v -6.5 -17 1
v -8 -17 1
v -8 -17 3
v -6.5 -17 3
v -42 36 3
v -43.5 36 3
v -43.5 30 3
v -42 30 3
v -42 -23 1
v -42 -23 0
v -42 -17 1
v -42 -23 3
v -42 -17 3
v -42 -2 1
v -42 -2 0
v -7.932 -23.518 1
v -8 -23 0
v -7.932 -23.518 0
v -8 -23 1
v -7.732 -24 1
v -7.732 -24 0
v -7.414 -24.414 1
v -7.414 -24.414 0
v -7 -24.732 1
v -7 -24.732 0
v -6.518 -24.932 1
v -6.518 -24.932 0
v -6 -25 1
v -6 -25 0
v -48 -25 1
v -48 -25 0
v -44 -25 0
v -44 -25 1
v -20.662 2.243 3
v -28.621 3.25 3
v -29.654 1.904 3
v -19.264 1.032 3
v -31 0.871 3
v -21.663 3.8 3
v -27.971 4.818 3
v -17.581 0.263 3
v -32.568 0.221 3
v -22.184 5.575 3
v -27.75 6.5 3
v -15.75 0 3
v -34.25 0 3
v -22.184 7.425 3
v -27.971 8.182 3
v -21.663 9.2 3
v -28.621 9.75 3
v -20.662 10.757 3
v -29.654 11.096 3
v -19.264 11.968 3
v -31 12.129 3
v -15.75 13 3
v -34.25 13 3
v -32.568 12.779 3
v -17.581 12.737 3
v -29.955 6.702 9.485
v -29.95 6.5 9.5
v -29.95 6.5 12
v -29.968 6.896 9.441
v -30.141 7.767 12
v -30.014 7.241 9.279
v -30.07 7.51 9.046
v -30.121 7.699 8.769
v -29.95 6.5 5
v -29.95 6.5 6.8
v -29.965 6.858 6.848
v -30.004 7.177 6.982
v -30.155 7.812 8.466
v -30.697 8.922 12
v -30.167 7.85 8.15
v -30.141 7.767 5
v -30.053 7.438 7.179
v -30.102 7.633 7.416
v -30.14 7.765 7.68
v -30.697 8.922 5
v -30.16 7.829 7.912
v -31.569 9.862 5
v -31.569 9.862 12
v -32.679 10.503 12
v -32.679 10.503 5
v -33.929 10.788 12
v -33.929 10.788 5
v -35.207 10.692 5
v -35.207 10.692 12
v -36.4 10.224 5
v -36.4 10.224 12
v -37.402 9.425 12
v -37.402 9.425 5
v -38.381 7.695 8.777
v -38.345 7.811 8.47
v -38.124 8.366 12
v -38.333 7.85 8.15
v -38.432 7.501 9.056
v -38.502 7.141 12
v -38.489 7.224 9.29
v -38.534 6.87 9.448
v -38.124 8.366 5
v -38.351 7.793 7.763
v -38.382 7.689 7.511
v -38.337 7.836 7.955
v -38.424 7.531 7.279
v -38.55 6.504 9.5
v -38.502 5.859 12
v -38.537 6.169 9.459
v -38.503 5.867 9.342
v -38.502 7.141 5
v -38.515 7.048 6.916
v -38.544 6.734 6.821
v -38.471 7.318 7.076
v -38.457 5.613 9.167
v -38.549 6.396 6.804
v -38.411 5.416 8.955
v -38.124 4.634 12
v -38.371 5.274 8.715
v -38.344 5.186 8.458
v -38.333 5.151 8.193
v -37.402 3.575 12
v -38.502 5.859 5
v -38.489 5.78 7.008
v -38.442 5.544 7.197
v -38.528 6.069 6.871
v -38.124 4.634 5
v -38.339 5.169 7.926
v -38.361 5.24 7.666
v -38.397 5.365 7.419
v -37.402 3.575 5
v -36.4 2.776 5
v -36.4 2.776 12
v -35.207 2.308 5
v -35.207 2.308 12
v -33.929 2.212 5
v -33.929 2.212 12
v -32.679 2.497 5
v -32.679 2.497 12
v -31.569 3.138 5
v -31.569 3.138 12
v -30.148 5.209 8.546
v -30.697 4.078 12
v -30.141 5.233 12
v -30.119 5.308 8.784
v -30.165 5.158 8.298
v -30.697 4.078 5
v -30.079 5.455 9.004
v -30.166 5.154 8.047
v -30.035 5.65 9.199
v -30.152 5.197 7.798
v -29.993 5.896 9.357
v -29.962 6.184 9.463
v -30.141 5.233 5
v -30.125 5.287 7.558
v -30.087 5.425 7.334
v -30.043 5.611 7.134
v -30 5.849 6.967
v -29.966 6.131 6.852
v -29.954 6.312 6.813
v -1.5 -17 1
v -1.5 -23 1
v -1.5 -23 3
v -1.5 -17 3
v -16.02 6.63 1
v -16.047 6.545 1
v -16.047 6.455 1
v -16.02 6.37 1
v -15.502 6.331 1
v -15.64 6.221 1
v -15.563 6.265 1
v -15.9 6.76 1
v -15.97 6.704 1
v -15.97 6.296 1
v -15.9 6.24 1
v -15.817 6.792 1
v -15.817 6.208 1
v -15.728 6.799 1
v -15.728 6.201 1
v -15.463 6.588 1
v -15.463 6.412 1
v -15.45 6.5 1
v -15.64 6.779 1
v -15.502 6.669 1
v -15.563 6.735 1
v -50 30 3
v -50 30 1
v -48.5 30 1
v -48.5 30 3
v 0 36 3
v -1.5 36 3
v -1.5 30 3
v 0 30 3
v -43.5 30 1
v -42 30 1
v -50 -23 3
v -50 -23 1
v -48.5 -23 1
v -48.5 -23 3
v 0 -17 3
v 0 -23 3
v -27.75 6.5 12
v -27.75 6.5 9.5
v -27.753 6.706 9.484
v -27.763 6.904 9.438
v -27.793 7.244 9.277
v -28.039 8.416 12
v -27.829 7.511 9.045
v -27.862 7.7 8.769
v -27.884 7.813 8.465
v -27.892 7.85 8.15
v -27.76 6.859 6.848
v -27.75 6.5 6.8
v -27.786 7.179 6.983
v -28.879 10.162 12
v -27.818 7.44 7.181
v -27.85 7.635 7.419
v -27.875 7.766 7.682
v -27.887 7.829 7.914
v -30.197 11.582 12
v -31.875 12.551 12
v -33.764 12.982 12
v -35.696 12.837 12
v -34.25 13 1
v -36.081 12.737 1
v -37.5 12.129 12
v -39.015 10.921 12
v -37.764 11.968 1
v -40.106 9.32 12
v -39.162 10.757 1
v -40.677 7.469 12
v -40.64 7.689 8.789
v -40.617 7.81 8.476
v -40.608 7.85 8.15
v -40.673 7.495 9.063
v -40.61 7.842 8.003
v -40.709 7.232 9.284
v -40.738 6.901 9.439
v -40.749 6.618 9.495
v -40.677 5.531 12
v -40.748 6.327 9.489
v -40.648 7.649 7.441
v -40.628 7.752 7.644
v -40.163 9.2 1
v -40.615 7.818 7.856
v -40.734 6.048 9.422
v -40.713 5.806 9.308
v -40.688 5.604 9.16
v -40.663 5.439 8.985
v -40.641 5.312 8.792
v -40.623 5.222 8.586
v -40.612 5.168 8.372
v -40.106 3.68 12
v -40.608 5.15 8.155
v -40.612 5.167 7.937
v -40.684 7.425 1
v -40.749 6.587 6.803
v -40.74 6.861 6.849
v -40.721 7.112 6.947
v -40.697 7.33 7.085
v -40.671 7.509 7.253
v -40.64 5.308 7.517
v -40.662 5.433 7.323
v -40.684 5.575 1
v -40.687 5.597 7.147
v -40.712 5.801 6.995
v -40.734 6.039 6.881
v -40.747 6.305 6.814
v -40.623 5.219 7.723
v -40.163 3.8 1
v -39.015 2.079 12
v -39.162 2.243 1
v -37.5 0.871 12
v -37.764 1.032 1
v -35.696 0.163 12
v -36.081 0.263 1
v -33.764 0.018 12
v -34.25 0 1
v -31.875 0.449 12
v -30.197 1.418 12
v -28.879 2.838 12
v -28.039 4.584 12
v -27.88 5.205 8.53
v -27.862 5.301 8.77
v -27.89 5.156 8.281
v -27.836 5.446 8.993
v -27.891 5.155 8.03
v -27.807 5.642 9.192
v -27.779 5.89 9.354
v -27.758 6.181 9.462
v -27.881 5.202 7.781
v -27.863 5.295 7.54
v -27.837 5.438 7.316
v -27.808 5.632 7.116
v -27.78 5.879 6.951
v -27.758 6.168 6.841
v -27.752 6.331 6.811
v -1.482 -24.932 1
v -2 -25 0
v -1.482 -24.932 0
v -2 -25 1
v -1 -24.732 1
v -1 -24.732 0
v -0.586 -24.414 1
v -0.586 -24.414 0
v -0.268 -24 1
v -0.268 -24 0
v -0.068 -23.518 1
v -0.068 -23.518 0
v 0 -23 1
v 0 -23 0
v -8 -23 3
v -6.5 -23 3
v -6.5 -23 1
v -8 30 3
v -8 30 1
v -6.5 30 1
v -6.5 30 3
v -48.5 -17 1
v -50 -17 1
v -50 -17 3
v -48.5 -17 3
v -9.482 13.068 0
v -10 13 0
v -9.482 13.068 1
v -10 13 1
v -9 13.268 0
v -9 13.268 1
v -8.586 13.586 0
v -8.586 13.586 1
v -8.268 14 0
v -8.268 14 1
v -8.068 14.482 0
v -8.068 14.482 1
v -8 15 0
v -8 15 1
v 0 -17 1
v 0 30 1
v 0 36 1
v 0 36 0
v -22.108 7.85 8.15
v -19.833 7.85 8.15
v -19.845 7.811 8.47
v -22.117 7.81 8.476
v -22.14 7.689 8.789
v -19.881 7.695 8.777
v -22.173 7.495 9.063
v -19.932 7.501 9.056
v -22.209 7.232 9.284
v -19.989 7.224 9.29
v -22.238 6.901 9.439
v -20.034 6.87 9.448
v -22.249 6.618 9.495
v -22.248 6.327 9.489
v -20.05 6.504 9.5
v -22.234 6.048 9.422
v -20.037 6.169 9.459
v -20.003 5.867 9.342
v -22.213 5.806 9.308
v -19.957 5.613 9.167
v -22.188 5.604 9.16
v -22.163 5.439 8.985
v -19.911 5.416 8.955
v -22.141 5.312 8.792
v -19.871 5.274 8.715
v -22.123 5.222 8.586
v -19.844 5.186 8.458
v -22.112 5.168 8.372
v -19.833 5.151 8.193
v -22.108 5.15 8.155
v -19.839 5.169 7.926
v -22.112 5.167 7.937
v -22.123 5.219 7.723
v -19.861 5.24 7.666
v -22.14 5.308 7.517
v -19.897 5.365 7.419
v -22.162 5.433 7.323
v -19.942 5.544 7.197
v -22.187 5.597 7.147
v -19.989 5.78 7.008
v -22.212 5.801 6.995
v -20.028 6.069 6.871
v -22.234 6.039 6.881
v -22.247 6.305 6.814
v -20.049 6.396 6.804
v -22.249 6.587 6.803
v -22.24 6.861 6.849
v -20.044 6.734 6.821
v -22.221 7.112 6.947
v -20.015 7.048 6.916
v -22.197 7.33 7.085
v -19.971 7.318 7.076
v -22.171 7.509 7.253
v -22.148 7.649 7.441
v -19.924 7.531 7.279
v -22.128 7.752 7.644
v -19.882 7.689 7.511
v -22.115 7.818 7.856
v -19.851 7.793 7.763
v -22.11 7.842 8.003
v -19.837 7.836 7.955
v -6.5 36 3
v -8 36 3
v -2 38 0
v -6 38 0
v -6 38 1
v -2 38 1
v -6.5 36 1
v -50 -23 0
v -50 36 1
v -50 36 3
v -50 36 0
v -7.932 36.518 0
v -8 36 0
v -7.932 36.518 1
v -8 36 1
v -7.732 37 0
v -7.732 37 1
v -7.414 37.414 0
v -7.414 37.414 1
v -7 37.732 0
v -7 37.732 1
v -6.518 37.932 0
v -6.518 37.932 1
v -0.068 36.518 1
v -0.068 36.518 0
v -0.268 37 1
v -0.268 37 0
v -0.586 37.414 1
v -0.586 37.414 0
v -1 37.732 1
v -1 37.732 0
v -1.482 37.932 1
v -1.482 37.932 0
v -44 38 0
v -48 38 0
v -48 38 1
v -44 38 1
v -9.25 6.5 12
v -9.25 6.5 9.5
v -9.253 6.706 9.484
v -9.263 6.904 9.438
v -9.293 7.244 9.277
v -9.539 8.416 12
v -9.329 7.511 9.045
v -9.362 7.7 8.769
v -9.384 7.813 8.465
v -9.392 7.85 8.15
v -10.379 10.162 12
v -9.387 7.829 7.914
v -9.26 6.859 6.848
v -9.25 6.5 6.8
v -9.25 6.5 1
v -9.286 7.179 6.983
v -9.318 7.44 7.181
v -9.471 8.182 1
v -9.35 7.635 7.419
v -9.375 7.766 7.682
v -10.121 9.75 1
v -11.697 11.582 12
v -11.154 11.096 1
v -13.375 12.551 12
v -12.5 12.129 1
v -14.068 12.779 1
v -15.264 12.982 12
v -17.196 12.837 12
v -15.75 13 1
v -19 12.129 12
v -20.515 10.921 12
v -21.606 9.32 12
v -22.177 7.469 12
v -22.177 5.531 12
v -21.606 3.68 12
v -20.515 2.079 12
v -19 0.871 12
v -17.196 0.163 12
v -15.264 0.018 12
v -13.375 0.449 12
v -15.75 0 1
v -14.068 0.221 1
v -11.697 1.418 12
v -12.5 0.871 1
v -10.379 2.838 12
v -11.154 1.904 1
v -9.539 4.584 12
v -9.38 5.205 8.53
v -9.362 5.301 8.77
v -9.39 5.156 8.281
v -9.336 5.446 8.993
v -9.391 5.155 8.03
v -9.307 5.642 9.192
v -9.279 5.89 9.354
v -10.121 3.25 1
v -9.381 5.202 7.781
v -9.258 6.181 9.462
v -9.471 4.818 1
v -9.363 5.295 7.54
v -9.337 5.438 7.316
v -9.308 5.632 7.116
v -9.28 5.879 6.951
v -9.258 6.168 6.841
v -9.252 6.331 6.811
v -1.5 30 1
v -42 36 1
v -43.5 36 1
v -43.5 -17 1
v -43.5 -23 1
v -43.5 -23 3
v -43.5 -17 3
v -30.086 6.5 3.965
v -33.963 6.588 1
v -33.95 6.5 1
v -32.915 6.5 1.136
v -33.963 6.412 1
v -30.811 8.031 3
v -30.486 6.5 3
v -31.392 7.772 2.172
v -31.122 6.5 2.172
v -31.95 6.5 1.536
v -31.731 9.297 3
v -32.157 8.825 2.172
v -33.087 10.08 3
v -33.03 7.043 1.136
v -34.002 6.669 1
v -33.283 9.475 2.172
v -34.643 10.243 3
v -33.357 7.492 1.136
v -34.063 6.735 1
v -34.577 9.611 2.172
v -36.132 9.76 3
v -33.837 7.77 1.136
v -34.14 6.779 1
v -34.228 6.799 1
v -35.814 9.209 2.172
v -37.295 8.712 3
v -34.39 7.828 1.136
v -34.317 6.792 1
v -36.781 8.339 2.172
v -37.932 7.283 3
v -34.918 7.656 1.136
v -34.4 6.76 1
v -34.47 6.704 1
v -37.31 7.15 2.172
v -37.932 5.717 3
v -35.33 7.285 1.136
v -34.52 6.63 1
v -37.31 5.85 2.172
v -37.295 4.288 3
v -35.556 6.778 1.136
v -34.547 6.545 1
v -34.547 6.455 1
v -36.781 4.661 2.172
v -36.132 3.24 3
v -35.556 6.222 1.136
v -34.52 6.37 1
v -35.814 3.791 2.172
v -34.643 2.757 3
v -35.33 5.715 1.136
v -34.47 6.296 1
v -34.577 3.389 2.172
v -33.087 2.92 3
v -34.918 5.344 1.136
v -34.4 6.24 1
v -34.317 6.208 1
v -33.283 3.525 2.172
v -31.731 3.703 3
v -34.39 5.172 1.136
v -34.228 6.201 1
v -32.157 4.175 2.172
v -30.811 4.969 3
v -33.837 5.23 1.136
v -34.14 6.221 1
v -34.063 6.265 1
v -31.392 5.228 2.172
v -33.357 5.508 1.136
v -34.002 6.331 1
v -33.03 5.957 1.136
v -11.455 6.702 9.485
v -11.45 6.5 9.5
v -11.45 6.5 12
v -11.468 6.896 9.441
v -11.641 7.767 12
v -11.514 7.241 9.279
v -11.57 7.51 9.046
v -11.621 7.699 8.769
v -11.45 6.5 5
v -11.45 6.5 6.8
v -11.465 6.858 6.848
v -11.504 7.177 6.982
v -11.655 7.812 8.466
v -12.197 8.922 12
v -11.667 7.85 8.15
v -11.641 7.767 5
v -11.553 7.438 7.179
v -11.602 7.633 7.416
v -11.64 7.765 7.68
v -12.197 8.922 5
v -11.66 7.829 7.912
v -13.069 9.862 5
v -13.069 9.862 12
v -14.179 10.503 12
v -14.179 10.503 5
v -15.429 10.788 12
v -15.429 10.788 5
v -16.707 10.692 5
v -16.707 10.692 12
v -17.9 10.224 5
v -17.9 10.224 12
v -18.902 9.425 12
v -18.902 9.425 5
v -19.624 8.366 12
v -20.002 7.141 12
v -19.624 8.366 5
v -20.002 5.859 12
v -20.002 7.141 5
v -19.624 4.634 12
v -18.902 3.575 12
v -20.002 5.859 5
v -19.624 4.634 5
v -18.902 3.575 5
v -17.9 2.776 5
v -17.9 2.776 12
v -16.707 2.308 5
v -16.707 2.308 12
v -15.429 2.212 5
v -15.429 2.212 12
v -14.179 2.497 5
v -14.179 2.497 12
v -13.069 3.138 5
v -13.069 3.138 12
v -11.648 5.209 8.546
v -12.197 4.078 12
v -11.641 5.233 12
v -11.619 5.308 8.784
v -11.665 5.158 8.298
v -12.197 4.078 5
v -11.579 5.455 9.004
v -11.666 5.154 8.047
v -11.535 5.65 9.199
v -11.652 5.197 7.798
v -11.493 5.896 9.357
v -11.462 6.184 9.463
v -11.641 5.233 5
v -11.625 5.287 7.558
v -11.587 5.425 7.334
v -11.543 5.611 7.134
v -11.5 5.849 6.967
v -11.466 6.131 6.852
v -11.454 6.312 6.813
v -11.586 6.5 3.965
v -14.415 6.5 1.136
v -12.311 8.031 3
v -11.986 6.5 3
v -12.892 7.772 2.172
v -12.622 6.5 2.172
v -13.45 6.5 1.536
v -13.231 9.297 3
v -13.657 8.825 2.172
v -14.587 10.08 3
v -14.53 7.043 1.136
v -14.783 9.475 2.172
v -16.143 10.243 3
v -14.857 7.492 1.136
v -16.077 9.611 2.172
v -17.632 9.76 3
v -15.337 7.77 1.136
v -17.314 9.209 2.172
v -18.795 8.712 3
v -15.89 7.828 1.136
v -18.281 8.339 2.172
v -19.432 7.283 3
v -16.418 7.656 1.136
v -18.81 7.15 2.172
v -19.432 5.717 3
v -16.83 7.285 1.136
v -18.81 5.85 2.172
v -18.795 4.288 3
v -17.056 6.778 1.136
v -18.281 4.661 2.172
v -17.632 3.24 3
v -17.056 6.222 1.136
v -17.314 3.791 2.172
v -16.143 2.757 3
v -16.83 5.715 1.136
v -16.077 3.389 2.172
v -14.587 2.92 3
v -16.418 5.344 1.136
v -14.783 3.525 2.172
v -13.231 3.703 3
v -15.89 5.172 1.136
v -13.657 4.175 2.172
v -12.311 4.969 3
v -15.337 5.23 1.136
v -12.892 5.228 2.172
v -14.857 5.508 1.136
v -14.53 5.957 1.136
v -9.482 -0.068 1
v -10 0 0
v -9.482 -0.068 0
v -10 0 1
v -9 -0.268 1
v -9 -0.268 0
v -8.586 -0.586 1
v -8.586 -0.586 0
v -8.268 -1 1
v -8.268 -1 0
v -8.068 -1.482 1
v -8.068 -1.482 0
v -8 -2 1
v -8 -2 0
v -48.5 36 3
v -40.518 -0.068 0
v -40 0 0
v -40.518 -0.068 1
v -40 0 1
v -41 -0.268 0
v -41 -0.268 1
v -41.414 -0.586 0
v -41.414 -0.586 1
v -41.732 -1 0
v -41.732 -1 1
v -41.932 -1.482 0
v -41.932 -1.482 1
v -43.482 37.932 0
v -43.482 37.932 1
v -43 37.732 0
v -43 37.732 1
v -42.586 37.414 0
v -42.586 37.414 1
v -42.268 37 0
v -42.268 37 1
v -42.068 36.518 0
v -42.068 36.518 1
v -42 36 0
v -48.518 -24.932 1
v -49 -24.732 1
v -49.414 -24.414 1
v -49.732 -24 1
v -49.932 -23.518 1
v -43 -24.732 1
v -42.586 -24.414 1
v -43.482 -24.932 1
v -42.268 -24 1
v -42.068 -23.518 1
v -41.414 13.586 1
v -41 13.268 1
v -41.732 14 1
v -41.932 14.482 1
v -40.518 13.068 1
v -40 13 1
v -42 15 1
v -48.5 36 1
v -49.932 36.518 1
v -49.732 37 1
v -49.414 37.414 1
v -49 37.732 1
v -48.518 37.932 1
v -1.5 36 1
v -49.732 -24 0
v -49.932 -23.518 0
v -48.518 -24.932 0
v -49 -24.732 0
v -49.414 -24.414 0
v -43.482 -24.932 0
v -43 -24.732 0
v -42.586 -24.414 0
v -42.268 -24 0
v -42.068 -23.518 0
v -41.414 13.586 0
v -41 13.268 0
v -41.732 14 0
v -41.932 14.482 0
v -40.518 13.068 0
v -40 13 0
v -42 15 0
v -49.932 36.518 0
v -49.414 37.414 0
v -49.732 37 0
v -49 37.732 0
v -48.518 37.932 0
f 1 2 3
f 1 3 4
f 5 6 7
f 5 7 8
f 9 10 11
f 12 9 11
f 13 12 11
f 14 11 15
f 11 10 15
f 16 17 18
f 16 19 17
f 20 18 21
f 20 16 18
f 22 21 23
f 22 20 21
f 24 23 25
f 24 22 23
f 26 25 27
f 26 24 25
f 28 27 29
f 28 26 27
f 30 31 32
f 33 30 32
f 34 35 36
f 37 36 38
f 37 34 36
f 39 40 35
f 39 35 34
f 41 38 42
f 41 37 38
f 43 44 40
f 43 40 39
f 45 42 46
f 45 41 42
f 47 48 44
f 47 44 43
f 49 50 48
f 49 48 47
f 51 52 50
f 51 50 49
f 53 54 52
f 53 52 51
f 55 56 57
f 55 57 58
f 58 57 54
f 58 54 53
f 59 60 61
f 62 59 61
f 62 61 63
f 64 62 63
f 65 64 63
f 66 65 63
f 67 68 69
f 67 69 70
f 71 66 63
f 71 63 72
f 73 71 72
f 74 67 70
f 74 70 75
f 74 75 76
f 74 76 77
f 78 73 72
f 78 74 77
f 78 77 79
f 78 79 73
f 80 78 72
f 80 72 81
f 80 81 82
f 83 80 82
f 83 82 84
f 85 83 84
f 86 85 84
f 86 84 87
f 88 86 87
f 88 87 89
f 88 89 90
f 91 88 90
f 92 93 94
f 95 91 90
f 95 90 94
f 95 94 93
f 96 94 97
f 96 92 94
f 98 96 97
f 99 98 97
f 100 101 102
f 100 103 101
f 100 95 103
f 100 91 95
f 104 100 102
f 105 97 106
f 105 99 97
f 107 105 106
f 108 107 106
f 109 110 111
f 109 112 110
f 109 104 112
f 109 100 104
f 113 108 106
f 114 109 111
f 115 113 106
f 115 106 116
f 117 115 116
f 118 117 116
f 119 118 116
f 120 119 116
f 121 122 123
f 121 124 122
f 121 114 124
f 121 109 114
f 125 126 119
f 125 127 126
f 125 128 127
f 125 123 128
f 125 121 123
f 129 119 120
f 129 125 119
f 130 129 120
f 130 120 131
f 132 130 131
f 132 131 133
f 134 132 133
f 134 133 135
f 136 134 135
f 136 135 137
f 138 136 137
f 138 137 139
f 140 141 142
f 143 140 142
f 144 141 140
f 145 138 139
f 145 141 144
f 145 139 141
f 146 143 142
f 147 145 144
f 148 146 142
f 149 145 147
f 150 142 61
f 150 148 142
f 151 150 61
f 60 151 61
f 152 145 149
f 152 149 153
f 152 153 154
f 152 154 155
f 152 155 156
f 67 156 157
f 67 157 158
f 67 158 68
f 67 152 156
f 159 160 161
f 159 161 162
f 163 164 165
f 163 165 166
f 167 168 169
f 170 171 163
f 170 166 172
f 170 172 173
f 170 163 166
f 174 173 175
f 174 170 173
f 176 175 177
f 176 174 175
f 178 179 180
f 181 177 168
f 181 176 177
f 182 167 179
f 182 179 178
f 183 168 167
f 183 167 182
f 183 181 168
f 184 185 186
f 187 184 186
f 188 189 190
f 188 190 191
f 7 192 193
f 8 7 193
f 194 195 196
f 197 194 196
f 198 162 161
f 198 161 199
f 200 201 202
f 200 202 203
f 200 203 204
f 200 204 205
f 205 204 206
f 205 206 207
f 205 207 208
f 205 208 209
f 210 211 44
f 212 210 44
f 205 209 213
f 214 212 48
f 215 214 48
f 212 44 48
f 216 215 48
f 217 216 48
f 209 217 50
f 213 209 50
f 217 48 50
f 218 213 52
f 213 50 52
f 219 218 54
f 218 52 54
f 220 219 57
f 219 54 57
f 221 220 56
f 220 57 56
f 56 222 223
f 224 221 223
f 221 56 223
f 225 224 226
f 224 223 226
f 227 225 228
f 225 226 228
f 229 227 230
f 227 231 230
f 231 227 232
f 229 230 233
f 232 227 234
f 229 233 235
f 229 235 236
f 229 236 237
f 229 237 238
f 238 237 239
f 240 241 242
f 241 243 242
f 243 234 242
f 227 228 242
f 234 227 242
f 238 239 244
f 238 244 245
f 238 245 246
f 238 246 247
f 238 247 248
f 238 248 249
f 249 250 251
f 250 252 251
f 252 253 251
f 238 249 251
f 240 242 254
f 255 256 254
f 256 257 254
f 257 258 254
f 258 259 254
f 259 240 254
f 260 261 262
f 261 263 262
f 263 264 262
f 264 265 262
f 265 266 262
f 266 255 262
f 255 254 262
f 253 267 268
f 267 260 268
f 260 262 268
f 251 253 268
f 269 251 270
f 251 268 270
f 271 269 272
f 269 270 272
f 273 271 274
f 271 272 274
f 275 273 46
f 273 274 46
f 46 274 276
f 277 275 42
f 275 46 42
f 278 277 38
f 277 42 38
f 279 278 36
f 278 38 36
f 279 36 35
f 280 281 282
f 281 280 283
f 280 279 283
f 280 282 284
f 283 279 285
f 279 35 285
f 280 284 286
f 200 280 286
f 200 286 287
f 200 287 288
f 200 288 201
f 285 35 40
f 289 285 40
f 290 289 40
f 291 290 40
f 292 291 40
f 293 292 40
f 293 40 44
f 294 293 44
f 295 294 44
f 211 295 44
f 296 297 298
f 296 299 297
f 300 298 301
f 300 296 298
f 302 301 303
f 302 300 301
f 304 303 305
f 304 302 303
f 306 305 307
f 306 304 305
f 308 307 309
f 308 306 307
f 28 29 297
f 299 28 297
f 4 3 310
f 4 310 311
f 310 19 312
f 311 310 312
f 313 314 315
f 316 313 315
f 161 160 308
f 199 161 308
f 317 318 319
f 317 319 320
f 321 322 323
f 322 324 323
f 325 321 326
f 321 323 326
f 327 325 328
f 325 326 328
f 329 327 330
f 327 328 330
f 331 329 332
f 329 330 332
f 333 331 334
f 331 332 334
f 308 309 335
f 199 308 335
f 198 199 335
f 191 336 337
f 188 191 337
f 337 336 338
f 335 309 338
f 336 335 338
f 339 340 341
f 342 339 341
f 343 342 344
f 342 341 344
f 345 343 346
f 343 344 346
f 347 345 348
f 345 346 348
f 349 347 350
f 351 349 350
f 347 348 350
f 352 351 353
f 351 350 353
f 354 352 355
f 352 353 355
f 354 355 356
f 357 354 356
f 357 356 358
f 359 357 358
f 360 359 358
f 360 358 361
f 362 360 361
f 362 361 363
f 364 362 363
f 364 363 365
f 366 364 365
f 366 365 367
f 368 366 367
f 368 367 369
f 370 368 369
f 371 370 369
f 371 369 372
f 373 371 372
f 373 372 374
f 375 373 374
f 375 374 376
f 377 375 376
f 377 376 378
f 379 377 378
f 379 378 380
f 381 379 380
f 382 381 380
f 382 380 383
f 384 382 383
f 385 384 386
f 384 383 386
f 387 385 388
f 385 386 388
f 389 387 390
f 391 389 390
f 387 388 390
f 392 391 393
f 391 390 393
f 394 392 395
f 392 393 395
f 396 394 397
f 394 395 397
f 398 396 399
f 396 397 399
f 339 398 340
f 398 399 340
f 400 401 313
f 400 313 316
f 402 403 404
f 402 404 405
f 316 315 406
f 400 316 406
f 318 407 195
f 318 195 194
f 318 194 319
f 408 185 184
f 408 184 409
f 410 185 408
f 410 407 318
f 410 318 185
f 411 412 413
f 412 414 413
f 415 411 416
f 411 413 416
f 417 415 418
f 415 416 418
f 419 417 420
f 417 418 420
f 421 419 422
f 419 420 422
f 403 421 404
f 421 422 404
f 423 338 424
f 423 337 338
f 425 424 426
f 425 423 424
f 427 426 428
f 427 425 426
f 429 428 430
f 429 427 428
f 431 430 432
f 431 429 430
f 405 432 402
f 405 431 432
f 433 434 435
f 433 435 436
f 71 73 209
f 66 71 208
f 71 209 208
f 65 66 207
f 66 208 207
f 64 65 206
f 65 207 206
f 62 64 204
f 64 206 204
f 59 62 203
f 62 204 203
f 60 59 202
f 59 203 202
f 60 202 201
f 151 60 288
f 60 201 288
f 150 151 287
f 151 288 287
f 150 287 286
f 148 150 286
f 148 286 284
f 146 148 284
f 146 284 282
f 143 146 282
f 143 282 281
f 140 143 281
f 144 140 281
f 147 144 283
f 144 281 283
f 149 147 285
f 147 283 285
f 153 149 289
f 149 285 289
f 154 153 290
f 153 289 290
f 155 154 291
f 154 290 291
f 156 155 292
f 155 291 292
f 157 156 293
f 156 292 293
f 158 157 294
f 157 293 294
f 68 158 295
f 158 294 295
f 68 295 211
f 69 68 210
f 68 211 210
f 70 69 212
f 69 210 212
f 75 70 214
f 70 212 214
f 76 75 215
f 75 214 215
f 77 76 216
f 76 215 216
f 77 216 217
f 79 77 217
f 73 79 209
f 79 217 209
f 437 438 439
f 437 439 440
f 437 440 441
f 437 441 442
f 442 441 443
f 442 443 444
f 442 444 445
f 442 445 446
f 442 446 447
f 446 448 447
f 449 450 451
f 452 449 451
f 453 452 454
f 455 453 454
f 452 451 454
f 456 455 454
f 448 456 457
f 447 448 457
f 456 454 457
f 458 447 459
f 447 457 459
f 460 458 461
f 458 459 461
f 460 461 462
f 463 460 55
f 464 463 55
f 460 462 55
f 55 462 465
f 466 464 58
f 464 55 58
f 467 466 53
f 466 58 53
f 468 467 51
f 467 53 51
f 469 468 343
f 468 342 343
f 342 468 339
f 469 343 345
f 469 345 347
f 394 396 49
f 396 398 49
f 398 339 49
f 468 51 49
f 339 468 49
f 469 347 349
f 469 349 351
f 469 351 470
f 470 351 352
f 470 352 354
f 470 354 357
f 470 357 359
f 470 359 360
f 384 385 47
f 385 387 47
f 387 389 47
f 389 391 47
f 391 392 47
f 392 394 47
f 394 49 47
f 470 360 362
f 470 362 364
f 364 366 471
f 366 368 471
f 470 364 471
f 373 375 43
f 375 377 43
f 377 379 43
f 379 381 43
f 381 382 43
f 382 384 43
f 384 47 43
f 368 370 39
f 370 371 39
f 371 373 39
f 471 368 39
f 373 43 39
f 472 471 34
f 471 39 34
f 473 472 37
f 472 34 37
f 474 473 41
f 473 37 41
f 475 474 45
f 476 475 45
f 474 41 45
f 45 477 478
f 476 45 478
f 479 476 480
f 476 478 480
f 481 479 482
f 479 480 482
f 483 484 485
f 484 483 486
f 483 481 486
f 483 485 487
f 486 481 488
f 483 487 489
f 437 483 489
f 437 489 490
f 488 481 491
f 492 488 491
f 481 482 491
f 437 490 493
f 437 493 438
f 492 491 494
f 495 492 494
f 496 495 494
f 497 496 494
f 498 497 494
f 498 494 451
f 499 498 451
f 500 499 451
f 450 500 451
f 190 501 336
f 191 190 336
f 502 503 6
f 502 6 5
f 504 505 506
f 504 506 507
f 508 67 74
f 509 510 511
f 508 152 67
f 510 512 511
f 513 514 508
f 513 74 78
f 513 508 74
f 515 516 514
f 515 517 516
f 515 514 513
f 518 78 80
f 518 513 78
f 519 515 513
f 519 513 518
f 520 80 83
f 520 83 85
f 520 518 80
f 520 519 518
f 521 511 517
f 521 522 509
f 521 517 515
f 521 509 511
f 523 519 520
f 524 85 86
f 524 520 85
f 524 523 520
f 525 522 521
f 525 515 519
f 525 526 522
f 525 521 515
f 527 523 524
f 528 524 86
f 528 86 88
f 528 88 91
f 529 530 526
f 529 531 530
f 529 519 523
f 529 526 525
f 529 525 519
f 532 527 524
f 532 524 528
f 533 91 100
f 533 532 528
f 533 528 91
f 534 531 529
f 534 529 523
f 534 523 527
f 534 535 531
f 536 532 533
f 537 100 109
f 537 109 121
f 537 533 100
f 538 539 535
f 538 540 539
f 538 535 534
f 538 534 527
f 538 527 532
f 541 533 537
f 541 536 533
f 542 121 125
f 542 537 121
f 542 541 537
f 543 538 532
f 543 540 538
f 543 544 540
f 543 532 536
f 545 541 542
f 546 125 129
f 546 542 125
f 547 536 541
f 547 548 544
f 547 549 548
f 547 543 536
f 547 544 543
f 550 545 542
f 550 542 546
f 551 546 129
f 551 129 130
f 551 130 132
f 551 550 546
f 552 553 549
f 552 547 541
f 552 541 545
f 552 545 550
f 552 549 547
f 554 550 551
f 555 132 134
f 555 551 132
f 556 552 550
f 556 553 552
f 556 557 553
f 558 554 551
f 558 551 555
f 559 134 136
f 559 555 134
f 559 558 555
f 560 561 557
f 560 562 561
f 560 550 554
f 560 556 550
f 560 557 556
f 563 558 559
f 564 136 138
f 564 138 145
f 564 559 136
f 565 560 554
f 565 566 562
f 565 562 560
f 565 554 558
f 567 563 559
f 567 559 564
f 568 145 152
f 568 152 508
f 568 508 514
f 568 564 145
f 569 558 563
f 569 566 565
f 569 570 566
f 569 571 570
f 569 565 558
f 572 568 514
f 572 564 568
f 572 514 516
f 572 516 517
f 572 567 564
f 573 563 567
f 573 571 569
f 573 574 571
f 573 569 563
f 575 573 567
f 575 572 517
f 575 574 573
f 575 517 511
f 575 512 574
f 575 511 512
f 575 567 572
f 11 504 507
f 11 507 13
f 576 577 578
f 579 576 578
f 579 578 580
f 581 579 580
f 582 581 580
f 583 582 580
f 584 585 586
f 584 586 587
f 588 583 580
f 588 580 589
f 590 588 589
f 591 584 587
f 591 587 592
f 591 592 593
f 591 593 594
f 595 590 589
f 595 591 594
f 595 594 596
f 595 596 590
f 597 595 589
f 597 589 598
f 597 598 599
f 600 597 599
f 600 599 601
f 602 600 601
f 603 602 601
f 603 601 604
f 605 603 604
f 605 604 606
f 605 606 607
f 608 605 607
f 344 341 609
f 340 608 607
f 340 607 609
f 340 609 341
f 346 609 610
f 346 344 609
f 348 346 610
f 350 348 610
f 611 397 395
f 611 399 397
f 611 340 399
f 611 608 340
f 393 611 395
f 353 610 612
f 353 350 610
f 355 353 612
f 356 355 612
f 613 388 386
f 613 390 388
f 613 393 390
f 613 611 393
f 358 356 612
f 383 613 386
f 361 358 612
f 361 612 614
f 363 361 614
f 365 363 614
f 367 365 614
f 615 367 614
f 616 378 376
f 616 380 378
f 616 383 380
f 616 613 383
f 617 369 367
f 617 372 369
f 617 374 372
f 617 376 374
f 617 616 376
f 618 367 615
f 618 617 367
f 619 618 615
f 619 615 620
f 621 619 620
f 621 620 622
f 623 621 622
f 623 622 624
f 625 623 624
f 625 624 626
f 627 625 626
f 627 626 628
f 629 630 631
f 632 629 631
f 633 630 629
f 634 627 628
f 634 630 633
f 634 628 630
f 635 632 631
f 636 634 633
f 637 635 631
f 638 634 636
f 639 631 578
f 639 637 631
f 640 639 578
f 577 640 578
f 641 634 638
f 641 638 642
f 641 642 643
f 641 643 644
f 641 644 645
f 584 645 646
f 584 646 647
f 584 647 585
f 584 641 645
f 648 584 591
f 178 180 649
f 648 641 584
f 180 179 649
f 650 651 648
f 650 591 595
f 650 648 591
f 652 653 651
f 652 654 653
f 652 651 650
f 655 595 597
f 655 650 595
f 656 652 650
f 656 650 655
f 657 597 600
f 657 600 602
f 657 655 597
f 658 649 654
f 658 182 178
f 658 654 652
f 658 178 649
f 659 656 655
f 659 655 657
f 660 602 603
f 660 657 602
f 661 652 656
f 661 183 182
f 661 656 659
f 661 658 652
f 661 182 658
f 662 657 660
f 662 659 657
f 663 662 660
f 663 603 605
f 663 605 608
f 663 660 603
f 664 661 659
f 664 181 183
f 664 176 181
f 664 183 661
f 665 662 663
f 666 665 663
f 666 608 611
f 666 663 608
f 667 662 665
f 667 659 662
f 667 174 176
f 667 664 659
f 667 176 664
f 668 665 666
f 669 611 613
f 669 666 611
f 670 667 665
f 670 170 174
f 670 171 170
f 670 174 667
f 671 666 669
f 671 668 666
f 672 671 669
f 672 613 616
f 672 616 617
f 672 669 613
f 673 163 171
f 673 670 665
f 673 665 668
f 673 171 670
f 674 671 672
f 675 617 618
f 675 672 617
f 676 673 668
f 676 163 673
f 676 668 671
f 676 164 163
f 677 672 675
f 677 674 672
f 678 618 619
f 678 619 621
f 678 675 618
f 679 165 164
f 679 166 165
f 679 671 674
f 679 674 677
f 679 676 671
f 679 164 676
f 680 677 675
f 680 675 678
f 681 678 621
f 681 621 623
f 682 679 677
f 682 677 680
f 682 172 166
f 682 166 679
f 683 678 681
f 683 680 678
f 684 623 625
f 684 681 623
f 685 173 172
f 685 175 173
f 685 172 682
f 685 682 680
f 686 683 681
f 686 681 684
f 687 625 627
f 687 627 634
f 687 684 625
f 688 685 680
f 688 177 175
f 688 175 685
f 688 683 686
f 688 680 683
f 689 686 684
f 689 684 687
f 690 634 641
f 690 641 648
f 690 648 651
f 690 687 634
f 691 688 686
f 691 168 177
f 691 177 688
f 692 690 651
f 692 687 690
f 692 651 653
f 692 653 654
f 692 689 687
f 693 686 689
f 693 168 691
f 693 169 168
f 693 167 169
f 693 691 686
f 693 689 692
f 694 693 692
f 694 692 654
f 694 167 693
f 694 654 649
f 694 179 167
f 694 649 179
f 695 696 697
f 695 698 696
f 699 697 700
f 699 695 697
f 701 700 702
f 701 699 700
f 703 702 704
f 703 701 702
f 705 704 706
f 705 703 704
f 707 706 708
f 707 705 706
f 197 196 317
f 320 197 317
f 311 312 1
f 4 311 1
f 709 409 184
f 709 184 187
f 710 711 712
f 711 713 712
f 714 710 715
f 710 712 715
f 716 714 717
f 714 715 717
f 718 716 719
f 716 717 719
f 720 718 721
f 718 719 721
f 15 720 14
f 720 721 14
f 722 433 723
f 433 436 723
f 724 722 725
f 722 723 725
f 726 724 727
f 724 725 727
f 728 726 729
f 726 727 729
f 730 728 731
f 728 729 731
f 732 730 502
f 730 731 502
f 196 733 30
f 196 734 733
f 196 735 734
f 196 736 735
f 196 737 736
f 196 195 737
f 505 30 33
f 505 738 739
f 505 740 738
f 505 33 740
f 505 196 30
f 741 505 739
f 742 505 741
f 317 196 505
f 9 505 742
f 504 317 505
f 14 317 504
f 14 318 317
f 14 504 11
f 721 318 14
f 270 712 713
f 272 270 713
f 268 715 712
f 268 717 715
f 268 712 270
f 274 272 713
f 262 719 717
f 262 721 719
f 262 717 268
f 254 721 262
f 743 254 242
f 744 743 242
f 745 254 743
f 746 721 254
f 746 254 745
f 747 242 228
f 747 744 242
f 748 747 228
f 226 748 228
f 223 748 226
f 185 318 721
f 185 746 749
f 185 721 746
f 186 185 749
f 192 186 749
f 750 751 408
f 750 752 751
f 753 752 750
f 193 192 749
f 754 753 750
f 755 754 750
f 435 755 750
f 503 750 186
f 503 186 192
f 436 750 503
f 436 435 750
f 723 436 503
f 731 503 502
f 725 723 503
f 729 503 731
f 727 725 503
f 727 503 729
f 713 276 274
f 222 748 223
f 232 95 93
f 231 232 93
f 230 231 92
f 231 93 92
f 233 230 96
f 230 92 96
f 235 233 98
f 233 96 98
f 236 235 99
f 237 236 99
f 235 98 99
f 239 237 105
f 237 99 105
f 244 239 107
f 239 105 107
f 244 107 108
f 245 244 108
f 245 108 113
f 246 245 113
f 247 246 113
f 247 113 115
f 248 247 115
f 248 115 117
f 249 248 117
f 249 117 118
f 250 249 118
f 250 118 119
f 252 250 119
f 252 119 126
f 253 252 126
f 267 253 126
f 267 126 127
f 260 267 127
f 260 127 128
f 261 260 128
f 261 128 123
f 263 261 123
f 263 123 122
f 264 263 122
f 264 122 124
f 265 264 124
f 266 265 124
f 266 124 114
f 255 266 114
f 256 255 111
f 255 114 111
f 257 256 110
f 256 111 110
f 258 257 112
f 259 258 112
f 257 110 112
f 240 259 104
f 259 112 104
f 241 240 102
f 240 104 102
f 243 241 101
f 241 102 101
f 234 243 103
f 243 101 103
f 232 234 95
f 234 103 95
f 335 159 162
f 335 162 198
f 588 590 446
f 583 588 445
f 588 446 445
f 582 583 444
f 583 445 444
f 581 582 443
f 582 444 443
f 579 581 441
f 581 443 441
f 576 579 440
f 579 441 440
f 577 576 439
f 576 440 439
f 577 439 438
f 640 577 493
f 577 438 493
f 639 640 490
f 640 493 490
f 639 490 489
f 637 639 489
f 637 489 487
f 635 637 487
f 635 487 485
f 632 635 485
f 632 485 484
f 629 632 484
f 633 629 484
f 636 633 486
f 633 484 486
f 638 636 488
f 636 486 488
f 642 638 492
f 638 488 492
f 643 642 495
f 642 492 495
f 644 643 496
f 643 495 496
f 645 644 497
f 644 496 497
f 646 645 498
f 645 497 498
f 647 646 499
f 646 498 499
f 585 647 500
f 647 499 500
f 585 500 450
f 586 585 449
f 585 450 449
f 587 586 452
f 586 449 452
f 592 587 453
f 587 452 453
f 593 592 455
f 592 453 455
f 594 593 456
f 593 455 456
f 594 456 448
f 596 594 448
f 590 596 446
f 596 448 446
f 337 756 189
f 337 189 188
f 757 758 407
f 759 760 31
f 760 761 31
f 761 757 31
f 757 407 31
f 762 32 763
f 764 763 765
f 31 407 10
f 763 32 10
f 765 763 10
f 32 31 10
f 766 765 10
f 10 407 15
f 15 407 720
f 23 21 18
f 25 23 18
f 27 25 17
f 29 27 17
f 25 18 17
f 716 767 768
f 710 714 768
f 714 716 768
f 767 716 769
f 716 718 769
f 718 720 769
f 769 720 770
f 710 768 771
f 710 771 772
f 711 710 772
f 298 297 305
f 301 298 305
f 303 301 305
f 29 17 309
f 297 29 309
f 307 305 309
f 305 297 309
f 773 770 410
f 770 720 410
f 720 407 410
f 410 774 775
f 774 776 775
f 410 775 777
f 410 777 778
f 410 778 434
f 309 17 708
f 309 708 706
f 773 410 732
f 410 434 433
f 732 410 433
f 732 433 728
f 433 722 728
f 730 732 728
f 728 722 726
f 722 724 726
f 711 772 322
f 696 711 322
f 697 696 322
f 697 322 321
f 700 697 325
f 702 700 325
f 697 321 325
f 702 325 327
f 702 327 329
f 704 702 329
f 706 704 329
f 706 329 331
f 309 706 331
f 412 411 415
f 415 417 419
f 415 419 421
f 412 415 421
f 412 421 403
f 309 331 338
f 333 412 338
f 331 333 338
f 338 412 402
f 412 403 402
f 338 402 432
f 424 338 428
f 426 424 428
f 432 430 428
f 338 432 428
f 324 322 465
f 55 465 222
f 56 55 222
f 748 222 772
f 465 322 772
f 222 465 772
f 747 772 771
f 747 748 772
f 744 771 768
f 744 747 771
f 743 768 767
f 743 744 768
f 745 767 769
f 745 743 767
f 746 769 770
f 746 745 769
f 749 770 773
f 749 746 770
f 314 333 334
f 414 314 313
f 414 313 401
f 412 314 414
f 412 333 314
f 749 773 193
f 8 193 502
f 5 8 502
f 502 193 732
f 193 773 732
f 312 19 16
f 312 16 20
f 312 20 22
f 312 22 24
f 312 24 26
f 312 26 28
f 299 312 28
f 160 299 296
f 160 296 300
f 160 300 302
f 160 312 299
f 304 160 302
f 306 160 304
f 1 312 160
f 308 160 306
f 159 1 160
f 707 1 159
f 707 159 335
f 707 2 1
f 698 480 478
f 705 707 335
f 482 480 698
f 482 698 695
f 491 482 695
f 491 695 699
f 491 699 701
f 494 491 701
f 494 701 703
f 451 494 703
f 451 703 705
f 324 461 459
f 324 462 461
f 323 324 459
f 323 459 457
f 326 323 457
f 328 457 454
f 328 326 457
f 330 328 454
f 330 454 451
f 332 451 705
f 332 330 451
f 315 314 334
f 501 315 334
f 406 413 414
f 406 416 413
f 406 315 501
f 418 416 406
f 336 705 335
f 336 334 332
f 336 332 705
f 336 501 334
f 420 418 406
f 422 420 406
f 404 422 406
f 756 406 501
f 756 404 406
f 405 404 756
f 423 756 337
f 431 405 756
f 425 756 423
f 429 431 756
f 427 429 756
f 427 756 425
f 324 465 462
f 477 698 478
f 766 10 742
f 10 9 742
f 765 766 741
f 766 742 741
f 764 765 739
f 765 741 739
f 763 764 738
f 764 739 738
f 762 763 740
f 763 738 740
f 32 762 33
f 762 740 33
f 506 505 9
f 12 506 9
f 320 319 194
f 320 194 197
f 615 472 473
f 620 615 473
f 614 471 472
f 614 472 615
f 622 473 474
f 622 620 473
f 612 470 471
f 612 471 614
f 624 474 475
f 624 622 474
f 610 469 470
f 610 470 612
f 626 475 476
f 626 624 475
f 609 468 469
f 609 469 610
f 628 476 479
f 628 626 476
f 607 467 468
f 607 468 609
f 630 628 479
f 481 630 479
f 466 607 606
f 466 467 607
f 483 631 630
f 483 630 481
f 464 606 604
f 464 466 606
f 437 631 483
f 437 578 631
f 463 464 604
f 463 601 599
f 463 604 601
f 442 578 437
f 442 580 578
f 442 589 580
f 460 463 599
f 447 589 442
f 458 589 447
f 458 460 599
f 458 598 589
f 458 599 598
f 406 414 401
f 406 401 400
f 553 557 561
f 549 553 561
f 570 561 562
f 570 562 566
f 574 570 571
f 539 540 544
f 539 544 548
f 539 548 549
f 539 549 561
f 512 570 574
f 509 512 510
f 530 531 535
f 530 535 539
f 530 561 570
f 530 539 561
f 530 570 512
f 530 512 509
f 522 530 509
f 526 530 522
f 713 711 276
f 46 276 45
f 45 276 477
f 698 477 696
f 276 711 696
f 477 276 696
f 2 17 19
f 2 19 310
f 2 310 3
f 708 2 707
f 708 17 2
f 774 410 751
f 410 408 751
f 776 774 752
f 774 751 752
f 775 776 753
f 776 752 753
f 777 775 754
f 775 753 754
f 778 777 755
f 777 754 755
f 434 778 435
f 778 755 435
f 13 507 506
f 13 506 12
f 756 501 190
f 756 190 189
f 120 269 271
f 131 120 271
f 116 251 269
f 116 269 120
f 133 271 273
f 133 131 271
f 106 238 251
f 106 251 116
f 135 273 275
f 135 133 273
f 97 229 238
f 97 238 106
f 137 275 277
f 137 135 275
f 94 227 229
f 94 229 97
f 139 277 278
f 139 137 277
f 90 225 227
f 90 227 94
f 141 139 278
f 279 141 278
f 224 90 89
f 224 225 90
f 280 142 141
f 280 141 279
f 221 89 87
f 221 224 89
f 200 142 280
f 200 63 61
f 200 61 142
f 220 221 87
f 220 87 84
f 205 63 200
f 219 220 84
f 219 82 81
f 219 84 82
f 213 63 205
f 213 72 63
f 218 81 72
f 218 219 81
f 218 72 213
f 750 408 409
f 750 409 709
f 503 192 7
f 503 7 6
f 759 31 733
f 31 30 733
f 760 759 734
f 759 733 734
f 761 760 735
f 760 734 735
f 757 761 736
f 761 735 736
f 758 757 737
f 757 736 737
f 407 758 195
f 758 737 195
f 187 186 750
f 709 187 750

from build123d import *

# Parameters (mm, degrees)
F0_W      = 8
F0_H      = 25
F1_DEPTH  = 1
F2_R      = 6.5
F2_R_2    = 4.3
F3_DEPTH  = 11
F4_R      = 4
F5_R      = 1.35
F6_DEPTH  = 50.001
F7_R      = 2
F8_W      = 1.5
F8_H      = 6
F9_DEPTH  = 2
F11_DEPTH = 2


with BuildPart() as f1:
    # F0 (on Top) → F1 (new body)
    with BuildSketch(Plane.XY):
        with Locations((-4, -12.5)):
            Rectangle(F0_W, F0_H)
        Polygon((-8, 0), (0, 0), (0, 13), (-8, 13), (-42, 13), (-50, 13), (-50, 0), (-42, 0), align=None)
        with Locations((-4, 25.5)):
            Rectangle(F0_W, F0_H)
        with Locations((-46, -12.5)):
            Rectangle(F0_W, F0_H)
        with Locations((-46, 25.5)):
            Rectangle(F0_W, F0_H)
    extrude(amount=F1_DEPTH)

    # F2 (on face) → F3 (join)
    with BuildSketch(Plane.XY.offset(1)):
        with Locations((-34.25, 6.5)):
            Circle(F2_R)
        with Locations((-34.25, 6.5)):
            Circle(F2_R_2, mode=Mode.SUBTRACT)
        with Locations((-15.75, 6.5)):
            Circle(F2_R)
        with Locations((-15.75, 6.5)):
            Circle(F2_R_2, mode=Mode.SUBTRACT)
    extrude(amount=F3_DEPTH)

    # F4
    f4_edges = [f1.edges().sort_by_distance(p)[0] for p in [
        (-38.55, 6.5, 1),
        (-20.05, 6.5, 1),
    ]]
    fillet(f4_edges, radius=F4_R)

    # F5 (on face) → F6 (cut, through all)
    with BuildSketch(Plane.YZ):
        with Locations((6.5, 8.15)):
            Circle(F5_R)
    extrude(amount=-F6_DEPTH, mode=Mode.SUBTRACT)

    # F7
    f7_edges = [f1.edges().sort_by_distance(p)[0] for p in [
        (-42, 38, 0.5),
        (0, 38, 0.5),
        (-8, 38, 0.5),
        (-42, 13, 0.5),
        (-8, 13, 0.5),
        (-8, 0, 0.5),
        (0, -25, 0.5),
        (-8, -25, 0.5),
        (-42, 0, 0.5),
        (-42, -25, 0.5),
        (-50, -25, 0.5),
        (-50, 38, 0.5),
    ]]
    fillet(f7_edges, radius=F7_R)

    # F8 (on face) → F9 (join)
    with BuildSketch(Plane.XY.offset(1)):
        with Locations((-49.25, 33)):
            Rectangle(F8_W, F8_H)
        with Locations((-42.75, 33)):
            Rectangle(F8_W, F8_H)
        with Locations((-42.75, -20)):
            Rectangle(F8_W, F8_H)
        with Locations((-49.25, -20)):
            Rectangle(F8_W, F8_H)
        with Locations((-0.75, 33)):
            Rectangle(F8_W, F8_H)
        with Locations((-7.25, 33)):
            Rectangle(F8_W, F8_H)
        with Locations((-7.25, -20)):
            Rectangle(F8_W, F8_H)
        with Locations((-0.75, -20)):
            Rectangle(F8_W, F8_H)
    extrude(amount=F9_DEPTH)

    # F10 (on face) → F11 (join)
    with BuildSketch(Plane.XY.offset(1)):
        with BuildLine():
            Line((-15.75, 13), (-34.25, 13))
            ThreePointArc((-34.25, 13), (-27.75, 6.5), (-34.25, 0))
            Line((-34.25, 0), (-15.75, 0))
            ThreePointArc((-15.75, 0), (-22.25, 6.5), (-15.75, 13))
        make_face()
    extrude(amount=F11_DEPTH)


solid = f1.part
